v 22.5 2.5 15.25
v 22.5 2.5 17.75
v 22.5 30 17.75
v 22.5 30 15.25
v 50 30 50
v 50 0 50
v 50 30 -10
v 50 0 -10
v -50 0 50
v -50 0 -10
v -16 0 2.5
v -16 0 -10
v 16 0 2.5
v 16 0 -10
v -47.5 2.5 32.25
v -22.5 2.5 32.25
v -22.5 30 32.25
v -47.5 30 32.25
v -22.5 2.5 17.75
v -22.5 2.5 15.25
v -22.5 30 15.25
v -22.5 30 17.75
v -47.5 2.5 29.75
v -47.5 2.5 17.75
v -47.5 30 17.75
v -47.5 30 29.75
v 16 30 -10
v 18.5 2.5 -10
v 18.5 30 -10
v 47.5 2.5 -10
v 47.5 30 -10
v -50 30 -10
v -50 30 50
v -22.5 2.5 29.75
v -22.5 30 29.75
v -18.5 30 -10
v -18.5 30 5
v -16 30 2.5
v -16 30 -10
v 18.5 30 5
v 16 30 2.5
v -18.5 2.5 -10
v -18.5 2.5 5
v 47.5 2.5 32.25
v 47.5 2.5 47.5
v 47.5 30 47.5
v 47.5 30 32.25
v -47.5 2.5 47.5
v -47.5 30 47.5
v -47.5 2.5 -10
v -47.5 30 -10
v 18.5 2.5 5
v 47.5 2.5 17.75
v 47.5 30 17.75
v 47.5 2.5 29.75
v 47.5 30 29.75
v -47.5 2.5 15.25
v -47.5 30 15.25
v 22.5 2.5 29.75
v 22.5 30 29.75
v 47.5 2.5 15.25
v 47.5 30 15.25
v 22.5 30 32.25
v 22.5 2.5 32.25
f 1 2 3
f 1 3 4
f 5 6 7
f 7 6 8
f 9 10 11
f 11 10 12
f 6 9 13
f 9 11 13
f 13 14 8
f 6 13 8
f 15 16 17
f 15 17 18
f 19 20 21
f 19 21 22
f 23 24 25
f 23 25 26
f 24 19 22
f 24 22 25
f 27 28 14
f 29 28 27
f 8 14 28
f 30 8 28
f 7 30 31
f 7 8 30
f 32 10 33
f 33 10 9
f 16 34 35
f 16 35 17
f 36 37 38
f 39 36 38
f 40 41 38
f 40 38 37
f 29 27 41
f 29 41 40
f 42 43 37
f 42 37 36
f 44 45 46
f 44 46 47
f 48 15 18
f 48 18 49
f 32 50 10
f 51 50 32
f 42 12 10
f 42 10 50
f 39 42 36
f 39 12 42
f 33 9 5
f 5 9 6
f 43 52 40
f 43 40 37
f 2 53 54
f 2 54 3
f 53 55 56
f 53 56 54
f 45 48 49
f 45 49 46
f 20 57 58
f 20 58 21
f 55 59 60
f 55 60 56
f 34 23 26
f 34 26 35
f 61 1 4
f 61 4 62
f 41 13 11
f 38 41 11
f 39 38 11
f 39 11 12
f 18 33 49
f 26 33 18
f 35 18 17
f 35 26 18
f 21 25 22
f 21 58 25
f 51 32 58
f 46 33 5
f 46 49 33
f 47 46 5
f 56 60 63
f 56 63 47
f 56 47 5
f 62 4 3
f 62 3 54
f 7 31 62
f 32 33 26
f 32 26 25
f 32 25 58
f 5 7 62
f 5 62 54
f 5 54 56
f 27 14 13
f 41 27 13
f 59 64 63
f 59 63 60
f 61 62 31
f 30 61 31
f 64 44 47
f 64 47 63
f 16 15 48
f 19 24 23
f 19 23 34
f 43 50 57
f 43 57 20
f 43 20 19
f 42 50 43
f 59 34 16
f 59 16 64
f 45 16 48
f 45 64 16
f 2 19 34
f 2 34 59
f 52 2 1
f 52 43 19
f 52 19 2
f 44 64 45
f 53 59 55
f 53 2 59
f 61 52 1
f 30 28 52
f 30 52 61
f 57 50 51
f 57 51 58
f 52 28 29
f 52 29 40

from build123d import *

# Parameters (mm, degrees)
SKETCH2_W           = 100
SKETCH2_H           = 100
BOSS_EXTRUDE1_DEPTH = 2.5
BOSS_EXTRUDE2_DEPTH = 27.5
SKETCH9_W           = 32
SKETCH9_H           = 52.5
CUT_EXTRUDE3_DEPTH  = 2.5
CUT_EXTRUDE4_REACH  = 117.758
SKETCH5_W           = 40
SKETCH5_H           = 30


with BuildPart() as part:
    # Sketch2 → Boss-Extrude1 (new body)
    with BuildSketch(Plane(origin=(0, 0, 0), x_dir=(1, 0, 0), z_dir=(0, 1, 0))):
        Rectangle(SKETCH2_W, SKETCH2_H)
    extrude(amount=BOSS_EXTRUDE1_DEPTH)

    # Sketch4 → Boss-Extrude2 (add)
    with BuildSketch(Plane(origin=(0, 2.5, 0), x_dir=(1, 0, 0), z_dir=(0, 1, 0))):
        Polygon((-50, 50), (-50, -50), (50, -50), (50, 50), (16, 50), (16, 47.5), (16, -2.5), (-16, -2.5), (-16, 47.5), (-16, 50), align=None)
        Polygon((-47.5, -47.5), (47.5, -47.5), (47.5, -32.25), (22.5, -32.25), (22.5, -29.75), (47.5, -29.75), (47.5, -17.75), (22.5, -17.75), (22.5, -15.25), (47.5, -15.25), (47.5, 47.5), (18.5, 47.5), (18.5, -5), (-18.5, -5), (-18.5, 47.5), (-47.5, 47.5), (-47.5, -15.25), (-22.5, -15.25), (-22.5, -17.75), (-47.5, -17.75), (-47.5, -29.75), (-22.5, -29.75), (-22.5, -32.25), (-47.5, -32.25), align=None, mode=Mode.SUBTRACT)
    extrude(amount=BOSS_EXTRUDE2_DEPTH)

    # Sketch9 → Cut-Extrude3 (cut)
    with BuildSketch(Plane(origin=(0, 2.5, 0), x_dir=(1, 0, 0), z_dir=(0, 1, 0))):
        with Locations((0, 23.75)):
            Rectangle(SKETCH9_W, SKETCH9_H)
    extrude(amount=-CUT_EXTRUDE3_DEPTH, mode=Mode.SUBTRACT)

    # Cut-Extrude4: up to this face of the body (flat: up to its plane)
    cut_extrude4_end = Plane(part.part.faces().sort_by_distance((-50, 15, 0))[0])
    # Sketch5 → Cut-Extrude4 (cut, up to the picked face)
    with BuildSketch(Plane(origin=(50, 0, 0), x_dir=(0, 0, -1), z_dir=(1, 0, 0)), mode=Mode.PRIVATE) as cut_extrude4_sk1:
        with Locations((30, 15)):
            Rectangle(SKETCH5_W, SKETCH5_H)
    cut_extrude4_tool1 = split(extrude(cut_extrude4_sk1.sketch, amount=-CUT_EXTRUDE4_REACH, mode=Mode.PRIVATE), bisect_by=cut_extrude4_end, keep=Keep.BOTH, mode=Mode.PRIVATE)
    add(cut_extrude4_tool1.solids().sort_by(Axis((50, 15, -30), (-1, 0, 0)))[0], mode=Mode.SUBTRACT)


solid = part.part
